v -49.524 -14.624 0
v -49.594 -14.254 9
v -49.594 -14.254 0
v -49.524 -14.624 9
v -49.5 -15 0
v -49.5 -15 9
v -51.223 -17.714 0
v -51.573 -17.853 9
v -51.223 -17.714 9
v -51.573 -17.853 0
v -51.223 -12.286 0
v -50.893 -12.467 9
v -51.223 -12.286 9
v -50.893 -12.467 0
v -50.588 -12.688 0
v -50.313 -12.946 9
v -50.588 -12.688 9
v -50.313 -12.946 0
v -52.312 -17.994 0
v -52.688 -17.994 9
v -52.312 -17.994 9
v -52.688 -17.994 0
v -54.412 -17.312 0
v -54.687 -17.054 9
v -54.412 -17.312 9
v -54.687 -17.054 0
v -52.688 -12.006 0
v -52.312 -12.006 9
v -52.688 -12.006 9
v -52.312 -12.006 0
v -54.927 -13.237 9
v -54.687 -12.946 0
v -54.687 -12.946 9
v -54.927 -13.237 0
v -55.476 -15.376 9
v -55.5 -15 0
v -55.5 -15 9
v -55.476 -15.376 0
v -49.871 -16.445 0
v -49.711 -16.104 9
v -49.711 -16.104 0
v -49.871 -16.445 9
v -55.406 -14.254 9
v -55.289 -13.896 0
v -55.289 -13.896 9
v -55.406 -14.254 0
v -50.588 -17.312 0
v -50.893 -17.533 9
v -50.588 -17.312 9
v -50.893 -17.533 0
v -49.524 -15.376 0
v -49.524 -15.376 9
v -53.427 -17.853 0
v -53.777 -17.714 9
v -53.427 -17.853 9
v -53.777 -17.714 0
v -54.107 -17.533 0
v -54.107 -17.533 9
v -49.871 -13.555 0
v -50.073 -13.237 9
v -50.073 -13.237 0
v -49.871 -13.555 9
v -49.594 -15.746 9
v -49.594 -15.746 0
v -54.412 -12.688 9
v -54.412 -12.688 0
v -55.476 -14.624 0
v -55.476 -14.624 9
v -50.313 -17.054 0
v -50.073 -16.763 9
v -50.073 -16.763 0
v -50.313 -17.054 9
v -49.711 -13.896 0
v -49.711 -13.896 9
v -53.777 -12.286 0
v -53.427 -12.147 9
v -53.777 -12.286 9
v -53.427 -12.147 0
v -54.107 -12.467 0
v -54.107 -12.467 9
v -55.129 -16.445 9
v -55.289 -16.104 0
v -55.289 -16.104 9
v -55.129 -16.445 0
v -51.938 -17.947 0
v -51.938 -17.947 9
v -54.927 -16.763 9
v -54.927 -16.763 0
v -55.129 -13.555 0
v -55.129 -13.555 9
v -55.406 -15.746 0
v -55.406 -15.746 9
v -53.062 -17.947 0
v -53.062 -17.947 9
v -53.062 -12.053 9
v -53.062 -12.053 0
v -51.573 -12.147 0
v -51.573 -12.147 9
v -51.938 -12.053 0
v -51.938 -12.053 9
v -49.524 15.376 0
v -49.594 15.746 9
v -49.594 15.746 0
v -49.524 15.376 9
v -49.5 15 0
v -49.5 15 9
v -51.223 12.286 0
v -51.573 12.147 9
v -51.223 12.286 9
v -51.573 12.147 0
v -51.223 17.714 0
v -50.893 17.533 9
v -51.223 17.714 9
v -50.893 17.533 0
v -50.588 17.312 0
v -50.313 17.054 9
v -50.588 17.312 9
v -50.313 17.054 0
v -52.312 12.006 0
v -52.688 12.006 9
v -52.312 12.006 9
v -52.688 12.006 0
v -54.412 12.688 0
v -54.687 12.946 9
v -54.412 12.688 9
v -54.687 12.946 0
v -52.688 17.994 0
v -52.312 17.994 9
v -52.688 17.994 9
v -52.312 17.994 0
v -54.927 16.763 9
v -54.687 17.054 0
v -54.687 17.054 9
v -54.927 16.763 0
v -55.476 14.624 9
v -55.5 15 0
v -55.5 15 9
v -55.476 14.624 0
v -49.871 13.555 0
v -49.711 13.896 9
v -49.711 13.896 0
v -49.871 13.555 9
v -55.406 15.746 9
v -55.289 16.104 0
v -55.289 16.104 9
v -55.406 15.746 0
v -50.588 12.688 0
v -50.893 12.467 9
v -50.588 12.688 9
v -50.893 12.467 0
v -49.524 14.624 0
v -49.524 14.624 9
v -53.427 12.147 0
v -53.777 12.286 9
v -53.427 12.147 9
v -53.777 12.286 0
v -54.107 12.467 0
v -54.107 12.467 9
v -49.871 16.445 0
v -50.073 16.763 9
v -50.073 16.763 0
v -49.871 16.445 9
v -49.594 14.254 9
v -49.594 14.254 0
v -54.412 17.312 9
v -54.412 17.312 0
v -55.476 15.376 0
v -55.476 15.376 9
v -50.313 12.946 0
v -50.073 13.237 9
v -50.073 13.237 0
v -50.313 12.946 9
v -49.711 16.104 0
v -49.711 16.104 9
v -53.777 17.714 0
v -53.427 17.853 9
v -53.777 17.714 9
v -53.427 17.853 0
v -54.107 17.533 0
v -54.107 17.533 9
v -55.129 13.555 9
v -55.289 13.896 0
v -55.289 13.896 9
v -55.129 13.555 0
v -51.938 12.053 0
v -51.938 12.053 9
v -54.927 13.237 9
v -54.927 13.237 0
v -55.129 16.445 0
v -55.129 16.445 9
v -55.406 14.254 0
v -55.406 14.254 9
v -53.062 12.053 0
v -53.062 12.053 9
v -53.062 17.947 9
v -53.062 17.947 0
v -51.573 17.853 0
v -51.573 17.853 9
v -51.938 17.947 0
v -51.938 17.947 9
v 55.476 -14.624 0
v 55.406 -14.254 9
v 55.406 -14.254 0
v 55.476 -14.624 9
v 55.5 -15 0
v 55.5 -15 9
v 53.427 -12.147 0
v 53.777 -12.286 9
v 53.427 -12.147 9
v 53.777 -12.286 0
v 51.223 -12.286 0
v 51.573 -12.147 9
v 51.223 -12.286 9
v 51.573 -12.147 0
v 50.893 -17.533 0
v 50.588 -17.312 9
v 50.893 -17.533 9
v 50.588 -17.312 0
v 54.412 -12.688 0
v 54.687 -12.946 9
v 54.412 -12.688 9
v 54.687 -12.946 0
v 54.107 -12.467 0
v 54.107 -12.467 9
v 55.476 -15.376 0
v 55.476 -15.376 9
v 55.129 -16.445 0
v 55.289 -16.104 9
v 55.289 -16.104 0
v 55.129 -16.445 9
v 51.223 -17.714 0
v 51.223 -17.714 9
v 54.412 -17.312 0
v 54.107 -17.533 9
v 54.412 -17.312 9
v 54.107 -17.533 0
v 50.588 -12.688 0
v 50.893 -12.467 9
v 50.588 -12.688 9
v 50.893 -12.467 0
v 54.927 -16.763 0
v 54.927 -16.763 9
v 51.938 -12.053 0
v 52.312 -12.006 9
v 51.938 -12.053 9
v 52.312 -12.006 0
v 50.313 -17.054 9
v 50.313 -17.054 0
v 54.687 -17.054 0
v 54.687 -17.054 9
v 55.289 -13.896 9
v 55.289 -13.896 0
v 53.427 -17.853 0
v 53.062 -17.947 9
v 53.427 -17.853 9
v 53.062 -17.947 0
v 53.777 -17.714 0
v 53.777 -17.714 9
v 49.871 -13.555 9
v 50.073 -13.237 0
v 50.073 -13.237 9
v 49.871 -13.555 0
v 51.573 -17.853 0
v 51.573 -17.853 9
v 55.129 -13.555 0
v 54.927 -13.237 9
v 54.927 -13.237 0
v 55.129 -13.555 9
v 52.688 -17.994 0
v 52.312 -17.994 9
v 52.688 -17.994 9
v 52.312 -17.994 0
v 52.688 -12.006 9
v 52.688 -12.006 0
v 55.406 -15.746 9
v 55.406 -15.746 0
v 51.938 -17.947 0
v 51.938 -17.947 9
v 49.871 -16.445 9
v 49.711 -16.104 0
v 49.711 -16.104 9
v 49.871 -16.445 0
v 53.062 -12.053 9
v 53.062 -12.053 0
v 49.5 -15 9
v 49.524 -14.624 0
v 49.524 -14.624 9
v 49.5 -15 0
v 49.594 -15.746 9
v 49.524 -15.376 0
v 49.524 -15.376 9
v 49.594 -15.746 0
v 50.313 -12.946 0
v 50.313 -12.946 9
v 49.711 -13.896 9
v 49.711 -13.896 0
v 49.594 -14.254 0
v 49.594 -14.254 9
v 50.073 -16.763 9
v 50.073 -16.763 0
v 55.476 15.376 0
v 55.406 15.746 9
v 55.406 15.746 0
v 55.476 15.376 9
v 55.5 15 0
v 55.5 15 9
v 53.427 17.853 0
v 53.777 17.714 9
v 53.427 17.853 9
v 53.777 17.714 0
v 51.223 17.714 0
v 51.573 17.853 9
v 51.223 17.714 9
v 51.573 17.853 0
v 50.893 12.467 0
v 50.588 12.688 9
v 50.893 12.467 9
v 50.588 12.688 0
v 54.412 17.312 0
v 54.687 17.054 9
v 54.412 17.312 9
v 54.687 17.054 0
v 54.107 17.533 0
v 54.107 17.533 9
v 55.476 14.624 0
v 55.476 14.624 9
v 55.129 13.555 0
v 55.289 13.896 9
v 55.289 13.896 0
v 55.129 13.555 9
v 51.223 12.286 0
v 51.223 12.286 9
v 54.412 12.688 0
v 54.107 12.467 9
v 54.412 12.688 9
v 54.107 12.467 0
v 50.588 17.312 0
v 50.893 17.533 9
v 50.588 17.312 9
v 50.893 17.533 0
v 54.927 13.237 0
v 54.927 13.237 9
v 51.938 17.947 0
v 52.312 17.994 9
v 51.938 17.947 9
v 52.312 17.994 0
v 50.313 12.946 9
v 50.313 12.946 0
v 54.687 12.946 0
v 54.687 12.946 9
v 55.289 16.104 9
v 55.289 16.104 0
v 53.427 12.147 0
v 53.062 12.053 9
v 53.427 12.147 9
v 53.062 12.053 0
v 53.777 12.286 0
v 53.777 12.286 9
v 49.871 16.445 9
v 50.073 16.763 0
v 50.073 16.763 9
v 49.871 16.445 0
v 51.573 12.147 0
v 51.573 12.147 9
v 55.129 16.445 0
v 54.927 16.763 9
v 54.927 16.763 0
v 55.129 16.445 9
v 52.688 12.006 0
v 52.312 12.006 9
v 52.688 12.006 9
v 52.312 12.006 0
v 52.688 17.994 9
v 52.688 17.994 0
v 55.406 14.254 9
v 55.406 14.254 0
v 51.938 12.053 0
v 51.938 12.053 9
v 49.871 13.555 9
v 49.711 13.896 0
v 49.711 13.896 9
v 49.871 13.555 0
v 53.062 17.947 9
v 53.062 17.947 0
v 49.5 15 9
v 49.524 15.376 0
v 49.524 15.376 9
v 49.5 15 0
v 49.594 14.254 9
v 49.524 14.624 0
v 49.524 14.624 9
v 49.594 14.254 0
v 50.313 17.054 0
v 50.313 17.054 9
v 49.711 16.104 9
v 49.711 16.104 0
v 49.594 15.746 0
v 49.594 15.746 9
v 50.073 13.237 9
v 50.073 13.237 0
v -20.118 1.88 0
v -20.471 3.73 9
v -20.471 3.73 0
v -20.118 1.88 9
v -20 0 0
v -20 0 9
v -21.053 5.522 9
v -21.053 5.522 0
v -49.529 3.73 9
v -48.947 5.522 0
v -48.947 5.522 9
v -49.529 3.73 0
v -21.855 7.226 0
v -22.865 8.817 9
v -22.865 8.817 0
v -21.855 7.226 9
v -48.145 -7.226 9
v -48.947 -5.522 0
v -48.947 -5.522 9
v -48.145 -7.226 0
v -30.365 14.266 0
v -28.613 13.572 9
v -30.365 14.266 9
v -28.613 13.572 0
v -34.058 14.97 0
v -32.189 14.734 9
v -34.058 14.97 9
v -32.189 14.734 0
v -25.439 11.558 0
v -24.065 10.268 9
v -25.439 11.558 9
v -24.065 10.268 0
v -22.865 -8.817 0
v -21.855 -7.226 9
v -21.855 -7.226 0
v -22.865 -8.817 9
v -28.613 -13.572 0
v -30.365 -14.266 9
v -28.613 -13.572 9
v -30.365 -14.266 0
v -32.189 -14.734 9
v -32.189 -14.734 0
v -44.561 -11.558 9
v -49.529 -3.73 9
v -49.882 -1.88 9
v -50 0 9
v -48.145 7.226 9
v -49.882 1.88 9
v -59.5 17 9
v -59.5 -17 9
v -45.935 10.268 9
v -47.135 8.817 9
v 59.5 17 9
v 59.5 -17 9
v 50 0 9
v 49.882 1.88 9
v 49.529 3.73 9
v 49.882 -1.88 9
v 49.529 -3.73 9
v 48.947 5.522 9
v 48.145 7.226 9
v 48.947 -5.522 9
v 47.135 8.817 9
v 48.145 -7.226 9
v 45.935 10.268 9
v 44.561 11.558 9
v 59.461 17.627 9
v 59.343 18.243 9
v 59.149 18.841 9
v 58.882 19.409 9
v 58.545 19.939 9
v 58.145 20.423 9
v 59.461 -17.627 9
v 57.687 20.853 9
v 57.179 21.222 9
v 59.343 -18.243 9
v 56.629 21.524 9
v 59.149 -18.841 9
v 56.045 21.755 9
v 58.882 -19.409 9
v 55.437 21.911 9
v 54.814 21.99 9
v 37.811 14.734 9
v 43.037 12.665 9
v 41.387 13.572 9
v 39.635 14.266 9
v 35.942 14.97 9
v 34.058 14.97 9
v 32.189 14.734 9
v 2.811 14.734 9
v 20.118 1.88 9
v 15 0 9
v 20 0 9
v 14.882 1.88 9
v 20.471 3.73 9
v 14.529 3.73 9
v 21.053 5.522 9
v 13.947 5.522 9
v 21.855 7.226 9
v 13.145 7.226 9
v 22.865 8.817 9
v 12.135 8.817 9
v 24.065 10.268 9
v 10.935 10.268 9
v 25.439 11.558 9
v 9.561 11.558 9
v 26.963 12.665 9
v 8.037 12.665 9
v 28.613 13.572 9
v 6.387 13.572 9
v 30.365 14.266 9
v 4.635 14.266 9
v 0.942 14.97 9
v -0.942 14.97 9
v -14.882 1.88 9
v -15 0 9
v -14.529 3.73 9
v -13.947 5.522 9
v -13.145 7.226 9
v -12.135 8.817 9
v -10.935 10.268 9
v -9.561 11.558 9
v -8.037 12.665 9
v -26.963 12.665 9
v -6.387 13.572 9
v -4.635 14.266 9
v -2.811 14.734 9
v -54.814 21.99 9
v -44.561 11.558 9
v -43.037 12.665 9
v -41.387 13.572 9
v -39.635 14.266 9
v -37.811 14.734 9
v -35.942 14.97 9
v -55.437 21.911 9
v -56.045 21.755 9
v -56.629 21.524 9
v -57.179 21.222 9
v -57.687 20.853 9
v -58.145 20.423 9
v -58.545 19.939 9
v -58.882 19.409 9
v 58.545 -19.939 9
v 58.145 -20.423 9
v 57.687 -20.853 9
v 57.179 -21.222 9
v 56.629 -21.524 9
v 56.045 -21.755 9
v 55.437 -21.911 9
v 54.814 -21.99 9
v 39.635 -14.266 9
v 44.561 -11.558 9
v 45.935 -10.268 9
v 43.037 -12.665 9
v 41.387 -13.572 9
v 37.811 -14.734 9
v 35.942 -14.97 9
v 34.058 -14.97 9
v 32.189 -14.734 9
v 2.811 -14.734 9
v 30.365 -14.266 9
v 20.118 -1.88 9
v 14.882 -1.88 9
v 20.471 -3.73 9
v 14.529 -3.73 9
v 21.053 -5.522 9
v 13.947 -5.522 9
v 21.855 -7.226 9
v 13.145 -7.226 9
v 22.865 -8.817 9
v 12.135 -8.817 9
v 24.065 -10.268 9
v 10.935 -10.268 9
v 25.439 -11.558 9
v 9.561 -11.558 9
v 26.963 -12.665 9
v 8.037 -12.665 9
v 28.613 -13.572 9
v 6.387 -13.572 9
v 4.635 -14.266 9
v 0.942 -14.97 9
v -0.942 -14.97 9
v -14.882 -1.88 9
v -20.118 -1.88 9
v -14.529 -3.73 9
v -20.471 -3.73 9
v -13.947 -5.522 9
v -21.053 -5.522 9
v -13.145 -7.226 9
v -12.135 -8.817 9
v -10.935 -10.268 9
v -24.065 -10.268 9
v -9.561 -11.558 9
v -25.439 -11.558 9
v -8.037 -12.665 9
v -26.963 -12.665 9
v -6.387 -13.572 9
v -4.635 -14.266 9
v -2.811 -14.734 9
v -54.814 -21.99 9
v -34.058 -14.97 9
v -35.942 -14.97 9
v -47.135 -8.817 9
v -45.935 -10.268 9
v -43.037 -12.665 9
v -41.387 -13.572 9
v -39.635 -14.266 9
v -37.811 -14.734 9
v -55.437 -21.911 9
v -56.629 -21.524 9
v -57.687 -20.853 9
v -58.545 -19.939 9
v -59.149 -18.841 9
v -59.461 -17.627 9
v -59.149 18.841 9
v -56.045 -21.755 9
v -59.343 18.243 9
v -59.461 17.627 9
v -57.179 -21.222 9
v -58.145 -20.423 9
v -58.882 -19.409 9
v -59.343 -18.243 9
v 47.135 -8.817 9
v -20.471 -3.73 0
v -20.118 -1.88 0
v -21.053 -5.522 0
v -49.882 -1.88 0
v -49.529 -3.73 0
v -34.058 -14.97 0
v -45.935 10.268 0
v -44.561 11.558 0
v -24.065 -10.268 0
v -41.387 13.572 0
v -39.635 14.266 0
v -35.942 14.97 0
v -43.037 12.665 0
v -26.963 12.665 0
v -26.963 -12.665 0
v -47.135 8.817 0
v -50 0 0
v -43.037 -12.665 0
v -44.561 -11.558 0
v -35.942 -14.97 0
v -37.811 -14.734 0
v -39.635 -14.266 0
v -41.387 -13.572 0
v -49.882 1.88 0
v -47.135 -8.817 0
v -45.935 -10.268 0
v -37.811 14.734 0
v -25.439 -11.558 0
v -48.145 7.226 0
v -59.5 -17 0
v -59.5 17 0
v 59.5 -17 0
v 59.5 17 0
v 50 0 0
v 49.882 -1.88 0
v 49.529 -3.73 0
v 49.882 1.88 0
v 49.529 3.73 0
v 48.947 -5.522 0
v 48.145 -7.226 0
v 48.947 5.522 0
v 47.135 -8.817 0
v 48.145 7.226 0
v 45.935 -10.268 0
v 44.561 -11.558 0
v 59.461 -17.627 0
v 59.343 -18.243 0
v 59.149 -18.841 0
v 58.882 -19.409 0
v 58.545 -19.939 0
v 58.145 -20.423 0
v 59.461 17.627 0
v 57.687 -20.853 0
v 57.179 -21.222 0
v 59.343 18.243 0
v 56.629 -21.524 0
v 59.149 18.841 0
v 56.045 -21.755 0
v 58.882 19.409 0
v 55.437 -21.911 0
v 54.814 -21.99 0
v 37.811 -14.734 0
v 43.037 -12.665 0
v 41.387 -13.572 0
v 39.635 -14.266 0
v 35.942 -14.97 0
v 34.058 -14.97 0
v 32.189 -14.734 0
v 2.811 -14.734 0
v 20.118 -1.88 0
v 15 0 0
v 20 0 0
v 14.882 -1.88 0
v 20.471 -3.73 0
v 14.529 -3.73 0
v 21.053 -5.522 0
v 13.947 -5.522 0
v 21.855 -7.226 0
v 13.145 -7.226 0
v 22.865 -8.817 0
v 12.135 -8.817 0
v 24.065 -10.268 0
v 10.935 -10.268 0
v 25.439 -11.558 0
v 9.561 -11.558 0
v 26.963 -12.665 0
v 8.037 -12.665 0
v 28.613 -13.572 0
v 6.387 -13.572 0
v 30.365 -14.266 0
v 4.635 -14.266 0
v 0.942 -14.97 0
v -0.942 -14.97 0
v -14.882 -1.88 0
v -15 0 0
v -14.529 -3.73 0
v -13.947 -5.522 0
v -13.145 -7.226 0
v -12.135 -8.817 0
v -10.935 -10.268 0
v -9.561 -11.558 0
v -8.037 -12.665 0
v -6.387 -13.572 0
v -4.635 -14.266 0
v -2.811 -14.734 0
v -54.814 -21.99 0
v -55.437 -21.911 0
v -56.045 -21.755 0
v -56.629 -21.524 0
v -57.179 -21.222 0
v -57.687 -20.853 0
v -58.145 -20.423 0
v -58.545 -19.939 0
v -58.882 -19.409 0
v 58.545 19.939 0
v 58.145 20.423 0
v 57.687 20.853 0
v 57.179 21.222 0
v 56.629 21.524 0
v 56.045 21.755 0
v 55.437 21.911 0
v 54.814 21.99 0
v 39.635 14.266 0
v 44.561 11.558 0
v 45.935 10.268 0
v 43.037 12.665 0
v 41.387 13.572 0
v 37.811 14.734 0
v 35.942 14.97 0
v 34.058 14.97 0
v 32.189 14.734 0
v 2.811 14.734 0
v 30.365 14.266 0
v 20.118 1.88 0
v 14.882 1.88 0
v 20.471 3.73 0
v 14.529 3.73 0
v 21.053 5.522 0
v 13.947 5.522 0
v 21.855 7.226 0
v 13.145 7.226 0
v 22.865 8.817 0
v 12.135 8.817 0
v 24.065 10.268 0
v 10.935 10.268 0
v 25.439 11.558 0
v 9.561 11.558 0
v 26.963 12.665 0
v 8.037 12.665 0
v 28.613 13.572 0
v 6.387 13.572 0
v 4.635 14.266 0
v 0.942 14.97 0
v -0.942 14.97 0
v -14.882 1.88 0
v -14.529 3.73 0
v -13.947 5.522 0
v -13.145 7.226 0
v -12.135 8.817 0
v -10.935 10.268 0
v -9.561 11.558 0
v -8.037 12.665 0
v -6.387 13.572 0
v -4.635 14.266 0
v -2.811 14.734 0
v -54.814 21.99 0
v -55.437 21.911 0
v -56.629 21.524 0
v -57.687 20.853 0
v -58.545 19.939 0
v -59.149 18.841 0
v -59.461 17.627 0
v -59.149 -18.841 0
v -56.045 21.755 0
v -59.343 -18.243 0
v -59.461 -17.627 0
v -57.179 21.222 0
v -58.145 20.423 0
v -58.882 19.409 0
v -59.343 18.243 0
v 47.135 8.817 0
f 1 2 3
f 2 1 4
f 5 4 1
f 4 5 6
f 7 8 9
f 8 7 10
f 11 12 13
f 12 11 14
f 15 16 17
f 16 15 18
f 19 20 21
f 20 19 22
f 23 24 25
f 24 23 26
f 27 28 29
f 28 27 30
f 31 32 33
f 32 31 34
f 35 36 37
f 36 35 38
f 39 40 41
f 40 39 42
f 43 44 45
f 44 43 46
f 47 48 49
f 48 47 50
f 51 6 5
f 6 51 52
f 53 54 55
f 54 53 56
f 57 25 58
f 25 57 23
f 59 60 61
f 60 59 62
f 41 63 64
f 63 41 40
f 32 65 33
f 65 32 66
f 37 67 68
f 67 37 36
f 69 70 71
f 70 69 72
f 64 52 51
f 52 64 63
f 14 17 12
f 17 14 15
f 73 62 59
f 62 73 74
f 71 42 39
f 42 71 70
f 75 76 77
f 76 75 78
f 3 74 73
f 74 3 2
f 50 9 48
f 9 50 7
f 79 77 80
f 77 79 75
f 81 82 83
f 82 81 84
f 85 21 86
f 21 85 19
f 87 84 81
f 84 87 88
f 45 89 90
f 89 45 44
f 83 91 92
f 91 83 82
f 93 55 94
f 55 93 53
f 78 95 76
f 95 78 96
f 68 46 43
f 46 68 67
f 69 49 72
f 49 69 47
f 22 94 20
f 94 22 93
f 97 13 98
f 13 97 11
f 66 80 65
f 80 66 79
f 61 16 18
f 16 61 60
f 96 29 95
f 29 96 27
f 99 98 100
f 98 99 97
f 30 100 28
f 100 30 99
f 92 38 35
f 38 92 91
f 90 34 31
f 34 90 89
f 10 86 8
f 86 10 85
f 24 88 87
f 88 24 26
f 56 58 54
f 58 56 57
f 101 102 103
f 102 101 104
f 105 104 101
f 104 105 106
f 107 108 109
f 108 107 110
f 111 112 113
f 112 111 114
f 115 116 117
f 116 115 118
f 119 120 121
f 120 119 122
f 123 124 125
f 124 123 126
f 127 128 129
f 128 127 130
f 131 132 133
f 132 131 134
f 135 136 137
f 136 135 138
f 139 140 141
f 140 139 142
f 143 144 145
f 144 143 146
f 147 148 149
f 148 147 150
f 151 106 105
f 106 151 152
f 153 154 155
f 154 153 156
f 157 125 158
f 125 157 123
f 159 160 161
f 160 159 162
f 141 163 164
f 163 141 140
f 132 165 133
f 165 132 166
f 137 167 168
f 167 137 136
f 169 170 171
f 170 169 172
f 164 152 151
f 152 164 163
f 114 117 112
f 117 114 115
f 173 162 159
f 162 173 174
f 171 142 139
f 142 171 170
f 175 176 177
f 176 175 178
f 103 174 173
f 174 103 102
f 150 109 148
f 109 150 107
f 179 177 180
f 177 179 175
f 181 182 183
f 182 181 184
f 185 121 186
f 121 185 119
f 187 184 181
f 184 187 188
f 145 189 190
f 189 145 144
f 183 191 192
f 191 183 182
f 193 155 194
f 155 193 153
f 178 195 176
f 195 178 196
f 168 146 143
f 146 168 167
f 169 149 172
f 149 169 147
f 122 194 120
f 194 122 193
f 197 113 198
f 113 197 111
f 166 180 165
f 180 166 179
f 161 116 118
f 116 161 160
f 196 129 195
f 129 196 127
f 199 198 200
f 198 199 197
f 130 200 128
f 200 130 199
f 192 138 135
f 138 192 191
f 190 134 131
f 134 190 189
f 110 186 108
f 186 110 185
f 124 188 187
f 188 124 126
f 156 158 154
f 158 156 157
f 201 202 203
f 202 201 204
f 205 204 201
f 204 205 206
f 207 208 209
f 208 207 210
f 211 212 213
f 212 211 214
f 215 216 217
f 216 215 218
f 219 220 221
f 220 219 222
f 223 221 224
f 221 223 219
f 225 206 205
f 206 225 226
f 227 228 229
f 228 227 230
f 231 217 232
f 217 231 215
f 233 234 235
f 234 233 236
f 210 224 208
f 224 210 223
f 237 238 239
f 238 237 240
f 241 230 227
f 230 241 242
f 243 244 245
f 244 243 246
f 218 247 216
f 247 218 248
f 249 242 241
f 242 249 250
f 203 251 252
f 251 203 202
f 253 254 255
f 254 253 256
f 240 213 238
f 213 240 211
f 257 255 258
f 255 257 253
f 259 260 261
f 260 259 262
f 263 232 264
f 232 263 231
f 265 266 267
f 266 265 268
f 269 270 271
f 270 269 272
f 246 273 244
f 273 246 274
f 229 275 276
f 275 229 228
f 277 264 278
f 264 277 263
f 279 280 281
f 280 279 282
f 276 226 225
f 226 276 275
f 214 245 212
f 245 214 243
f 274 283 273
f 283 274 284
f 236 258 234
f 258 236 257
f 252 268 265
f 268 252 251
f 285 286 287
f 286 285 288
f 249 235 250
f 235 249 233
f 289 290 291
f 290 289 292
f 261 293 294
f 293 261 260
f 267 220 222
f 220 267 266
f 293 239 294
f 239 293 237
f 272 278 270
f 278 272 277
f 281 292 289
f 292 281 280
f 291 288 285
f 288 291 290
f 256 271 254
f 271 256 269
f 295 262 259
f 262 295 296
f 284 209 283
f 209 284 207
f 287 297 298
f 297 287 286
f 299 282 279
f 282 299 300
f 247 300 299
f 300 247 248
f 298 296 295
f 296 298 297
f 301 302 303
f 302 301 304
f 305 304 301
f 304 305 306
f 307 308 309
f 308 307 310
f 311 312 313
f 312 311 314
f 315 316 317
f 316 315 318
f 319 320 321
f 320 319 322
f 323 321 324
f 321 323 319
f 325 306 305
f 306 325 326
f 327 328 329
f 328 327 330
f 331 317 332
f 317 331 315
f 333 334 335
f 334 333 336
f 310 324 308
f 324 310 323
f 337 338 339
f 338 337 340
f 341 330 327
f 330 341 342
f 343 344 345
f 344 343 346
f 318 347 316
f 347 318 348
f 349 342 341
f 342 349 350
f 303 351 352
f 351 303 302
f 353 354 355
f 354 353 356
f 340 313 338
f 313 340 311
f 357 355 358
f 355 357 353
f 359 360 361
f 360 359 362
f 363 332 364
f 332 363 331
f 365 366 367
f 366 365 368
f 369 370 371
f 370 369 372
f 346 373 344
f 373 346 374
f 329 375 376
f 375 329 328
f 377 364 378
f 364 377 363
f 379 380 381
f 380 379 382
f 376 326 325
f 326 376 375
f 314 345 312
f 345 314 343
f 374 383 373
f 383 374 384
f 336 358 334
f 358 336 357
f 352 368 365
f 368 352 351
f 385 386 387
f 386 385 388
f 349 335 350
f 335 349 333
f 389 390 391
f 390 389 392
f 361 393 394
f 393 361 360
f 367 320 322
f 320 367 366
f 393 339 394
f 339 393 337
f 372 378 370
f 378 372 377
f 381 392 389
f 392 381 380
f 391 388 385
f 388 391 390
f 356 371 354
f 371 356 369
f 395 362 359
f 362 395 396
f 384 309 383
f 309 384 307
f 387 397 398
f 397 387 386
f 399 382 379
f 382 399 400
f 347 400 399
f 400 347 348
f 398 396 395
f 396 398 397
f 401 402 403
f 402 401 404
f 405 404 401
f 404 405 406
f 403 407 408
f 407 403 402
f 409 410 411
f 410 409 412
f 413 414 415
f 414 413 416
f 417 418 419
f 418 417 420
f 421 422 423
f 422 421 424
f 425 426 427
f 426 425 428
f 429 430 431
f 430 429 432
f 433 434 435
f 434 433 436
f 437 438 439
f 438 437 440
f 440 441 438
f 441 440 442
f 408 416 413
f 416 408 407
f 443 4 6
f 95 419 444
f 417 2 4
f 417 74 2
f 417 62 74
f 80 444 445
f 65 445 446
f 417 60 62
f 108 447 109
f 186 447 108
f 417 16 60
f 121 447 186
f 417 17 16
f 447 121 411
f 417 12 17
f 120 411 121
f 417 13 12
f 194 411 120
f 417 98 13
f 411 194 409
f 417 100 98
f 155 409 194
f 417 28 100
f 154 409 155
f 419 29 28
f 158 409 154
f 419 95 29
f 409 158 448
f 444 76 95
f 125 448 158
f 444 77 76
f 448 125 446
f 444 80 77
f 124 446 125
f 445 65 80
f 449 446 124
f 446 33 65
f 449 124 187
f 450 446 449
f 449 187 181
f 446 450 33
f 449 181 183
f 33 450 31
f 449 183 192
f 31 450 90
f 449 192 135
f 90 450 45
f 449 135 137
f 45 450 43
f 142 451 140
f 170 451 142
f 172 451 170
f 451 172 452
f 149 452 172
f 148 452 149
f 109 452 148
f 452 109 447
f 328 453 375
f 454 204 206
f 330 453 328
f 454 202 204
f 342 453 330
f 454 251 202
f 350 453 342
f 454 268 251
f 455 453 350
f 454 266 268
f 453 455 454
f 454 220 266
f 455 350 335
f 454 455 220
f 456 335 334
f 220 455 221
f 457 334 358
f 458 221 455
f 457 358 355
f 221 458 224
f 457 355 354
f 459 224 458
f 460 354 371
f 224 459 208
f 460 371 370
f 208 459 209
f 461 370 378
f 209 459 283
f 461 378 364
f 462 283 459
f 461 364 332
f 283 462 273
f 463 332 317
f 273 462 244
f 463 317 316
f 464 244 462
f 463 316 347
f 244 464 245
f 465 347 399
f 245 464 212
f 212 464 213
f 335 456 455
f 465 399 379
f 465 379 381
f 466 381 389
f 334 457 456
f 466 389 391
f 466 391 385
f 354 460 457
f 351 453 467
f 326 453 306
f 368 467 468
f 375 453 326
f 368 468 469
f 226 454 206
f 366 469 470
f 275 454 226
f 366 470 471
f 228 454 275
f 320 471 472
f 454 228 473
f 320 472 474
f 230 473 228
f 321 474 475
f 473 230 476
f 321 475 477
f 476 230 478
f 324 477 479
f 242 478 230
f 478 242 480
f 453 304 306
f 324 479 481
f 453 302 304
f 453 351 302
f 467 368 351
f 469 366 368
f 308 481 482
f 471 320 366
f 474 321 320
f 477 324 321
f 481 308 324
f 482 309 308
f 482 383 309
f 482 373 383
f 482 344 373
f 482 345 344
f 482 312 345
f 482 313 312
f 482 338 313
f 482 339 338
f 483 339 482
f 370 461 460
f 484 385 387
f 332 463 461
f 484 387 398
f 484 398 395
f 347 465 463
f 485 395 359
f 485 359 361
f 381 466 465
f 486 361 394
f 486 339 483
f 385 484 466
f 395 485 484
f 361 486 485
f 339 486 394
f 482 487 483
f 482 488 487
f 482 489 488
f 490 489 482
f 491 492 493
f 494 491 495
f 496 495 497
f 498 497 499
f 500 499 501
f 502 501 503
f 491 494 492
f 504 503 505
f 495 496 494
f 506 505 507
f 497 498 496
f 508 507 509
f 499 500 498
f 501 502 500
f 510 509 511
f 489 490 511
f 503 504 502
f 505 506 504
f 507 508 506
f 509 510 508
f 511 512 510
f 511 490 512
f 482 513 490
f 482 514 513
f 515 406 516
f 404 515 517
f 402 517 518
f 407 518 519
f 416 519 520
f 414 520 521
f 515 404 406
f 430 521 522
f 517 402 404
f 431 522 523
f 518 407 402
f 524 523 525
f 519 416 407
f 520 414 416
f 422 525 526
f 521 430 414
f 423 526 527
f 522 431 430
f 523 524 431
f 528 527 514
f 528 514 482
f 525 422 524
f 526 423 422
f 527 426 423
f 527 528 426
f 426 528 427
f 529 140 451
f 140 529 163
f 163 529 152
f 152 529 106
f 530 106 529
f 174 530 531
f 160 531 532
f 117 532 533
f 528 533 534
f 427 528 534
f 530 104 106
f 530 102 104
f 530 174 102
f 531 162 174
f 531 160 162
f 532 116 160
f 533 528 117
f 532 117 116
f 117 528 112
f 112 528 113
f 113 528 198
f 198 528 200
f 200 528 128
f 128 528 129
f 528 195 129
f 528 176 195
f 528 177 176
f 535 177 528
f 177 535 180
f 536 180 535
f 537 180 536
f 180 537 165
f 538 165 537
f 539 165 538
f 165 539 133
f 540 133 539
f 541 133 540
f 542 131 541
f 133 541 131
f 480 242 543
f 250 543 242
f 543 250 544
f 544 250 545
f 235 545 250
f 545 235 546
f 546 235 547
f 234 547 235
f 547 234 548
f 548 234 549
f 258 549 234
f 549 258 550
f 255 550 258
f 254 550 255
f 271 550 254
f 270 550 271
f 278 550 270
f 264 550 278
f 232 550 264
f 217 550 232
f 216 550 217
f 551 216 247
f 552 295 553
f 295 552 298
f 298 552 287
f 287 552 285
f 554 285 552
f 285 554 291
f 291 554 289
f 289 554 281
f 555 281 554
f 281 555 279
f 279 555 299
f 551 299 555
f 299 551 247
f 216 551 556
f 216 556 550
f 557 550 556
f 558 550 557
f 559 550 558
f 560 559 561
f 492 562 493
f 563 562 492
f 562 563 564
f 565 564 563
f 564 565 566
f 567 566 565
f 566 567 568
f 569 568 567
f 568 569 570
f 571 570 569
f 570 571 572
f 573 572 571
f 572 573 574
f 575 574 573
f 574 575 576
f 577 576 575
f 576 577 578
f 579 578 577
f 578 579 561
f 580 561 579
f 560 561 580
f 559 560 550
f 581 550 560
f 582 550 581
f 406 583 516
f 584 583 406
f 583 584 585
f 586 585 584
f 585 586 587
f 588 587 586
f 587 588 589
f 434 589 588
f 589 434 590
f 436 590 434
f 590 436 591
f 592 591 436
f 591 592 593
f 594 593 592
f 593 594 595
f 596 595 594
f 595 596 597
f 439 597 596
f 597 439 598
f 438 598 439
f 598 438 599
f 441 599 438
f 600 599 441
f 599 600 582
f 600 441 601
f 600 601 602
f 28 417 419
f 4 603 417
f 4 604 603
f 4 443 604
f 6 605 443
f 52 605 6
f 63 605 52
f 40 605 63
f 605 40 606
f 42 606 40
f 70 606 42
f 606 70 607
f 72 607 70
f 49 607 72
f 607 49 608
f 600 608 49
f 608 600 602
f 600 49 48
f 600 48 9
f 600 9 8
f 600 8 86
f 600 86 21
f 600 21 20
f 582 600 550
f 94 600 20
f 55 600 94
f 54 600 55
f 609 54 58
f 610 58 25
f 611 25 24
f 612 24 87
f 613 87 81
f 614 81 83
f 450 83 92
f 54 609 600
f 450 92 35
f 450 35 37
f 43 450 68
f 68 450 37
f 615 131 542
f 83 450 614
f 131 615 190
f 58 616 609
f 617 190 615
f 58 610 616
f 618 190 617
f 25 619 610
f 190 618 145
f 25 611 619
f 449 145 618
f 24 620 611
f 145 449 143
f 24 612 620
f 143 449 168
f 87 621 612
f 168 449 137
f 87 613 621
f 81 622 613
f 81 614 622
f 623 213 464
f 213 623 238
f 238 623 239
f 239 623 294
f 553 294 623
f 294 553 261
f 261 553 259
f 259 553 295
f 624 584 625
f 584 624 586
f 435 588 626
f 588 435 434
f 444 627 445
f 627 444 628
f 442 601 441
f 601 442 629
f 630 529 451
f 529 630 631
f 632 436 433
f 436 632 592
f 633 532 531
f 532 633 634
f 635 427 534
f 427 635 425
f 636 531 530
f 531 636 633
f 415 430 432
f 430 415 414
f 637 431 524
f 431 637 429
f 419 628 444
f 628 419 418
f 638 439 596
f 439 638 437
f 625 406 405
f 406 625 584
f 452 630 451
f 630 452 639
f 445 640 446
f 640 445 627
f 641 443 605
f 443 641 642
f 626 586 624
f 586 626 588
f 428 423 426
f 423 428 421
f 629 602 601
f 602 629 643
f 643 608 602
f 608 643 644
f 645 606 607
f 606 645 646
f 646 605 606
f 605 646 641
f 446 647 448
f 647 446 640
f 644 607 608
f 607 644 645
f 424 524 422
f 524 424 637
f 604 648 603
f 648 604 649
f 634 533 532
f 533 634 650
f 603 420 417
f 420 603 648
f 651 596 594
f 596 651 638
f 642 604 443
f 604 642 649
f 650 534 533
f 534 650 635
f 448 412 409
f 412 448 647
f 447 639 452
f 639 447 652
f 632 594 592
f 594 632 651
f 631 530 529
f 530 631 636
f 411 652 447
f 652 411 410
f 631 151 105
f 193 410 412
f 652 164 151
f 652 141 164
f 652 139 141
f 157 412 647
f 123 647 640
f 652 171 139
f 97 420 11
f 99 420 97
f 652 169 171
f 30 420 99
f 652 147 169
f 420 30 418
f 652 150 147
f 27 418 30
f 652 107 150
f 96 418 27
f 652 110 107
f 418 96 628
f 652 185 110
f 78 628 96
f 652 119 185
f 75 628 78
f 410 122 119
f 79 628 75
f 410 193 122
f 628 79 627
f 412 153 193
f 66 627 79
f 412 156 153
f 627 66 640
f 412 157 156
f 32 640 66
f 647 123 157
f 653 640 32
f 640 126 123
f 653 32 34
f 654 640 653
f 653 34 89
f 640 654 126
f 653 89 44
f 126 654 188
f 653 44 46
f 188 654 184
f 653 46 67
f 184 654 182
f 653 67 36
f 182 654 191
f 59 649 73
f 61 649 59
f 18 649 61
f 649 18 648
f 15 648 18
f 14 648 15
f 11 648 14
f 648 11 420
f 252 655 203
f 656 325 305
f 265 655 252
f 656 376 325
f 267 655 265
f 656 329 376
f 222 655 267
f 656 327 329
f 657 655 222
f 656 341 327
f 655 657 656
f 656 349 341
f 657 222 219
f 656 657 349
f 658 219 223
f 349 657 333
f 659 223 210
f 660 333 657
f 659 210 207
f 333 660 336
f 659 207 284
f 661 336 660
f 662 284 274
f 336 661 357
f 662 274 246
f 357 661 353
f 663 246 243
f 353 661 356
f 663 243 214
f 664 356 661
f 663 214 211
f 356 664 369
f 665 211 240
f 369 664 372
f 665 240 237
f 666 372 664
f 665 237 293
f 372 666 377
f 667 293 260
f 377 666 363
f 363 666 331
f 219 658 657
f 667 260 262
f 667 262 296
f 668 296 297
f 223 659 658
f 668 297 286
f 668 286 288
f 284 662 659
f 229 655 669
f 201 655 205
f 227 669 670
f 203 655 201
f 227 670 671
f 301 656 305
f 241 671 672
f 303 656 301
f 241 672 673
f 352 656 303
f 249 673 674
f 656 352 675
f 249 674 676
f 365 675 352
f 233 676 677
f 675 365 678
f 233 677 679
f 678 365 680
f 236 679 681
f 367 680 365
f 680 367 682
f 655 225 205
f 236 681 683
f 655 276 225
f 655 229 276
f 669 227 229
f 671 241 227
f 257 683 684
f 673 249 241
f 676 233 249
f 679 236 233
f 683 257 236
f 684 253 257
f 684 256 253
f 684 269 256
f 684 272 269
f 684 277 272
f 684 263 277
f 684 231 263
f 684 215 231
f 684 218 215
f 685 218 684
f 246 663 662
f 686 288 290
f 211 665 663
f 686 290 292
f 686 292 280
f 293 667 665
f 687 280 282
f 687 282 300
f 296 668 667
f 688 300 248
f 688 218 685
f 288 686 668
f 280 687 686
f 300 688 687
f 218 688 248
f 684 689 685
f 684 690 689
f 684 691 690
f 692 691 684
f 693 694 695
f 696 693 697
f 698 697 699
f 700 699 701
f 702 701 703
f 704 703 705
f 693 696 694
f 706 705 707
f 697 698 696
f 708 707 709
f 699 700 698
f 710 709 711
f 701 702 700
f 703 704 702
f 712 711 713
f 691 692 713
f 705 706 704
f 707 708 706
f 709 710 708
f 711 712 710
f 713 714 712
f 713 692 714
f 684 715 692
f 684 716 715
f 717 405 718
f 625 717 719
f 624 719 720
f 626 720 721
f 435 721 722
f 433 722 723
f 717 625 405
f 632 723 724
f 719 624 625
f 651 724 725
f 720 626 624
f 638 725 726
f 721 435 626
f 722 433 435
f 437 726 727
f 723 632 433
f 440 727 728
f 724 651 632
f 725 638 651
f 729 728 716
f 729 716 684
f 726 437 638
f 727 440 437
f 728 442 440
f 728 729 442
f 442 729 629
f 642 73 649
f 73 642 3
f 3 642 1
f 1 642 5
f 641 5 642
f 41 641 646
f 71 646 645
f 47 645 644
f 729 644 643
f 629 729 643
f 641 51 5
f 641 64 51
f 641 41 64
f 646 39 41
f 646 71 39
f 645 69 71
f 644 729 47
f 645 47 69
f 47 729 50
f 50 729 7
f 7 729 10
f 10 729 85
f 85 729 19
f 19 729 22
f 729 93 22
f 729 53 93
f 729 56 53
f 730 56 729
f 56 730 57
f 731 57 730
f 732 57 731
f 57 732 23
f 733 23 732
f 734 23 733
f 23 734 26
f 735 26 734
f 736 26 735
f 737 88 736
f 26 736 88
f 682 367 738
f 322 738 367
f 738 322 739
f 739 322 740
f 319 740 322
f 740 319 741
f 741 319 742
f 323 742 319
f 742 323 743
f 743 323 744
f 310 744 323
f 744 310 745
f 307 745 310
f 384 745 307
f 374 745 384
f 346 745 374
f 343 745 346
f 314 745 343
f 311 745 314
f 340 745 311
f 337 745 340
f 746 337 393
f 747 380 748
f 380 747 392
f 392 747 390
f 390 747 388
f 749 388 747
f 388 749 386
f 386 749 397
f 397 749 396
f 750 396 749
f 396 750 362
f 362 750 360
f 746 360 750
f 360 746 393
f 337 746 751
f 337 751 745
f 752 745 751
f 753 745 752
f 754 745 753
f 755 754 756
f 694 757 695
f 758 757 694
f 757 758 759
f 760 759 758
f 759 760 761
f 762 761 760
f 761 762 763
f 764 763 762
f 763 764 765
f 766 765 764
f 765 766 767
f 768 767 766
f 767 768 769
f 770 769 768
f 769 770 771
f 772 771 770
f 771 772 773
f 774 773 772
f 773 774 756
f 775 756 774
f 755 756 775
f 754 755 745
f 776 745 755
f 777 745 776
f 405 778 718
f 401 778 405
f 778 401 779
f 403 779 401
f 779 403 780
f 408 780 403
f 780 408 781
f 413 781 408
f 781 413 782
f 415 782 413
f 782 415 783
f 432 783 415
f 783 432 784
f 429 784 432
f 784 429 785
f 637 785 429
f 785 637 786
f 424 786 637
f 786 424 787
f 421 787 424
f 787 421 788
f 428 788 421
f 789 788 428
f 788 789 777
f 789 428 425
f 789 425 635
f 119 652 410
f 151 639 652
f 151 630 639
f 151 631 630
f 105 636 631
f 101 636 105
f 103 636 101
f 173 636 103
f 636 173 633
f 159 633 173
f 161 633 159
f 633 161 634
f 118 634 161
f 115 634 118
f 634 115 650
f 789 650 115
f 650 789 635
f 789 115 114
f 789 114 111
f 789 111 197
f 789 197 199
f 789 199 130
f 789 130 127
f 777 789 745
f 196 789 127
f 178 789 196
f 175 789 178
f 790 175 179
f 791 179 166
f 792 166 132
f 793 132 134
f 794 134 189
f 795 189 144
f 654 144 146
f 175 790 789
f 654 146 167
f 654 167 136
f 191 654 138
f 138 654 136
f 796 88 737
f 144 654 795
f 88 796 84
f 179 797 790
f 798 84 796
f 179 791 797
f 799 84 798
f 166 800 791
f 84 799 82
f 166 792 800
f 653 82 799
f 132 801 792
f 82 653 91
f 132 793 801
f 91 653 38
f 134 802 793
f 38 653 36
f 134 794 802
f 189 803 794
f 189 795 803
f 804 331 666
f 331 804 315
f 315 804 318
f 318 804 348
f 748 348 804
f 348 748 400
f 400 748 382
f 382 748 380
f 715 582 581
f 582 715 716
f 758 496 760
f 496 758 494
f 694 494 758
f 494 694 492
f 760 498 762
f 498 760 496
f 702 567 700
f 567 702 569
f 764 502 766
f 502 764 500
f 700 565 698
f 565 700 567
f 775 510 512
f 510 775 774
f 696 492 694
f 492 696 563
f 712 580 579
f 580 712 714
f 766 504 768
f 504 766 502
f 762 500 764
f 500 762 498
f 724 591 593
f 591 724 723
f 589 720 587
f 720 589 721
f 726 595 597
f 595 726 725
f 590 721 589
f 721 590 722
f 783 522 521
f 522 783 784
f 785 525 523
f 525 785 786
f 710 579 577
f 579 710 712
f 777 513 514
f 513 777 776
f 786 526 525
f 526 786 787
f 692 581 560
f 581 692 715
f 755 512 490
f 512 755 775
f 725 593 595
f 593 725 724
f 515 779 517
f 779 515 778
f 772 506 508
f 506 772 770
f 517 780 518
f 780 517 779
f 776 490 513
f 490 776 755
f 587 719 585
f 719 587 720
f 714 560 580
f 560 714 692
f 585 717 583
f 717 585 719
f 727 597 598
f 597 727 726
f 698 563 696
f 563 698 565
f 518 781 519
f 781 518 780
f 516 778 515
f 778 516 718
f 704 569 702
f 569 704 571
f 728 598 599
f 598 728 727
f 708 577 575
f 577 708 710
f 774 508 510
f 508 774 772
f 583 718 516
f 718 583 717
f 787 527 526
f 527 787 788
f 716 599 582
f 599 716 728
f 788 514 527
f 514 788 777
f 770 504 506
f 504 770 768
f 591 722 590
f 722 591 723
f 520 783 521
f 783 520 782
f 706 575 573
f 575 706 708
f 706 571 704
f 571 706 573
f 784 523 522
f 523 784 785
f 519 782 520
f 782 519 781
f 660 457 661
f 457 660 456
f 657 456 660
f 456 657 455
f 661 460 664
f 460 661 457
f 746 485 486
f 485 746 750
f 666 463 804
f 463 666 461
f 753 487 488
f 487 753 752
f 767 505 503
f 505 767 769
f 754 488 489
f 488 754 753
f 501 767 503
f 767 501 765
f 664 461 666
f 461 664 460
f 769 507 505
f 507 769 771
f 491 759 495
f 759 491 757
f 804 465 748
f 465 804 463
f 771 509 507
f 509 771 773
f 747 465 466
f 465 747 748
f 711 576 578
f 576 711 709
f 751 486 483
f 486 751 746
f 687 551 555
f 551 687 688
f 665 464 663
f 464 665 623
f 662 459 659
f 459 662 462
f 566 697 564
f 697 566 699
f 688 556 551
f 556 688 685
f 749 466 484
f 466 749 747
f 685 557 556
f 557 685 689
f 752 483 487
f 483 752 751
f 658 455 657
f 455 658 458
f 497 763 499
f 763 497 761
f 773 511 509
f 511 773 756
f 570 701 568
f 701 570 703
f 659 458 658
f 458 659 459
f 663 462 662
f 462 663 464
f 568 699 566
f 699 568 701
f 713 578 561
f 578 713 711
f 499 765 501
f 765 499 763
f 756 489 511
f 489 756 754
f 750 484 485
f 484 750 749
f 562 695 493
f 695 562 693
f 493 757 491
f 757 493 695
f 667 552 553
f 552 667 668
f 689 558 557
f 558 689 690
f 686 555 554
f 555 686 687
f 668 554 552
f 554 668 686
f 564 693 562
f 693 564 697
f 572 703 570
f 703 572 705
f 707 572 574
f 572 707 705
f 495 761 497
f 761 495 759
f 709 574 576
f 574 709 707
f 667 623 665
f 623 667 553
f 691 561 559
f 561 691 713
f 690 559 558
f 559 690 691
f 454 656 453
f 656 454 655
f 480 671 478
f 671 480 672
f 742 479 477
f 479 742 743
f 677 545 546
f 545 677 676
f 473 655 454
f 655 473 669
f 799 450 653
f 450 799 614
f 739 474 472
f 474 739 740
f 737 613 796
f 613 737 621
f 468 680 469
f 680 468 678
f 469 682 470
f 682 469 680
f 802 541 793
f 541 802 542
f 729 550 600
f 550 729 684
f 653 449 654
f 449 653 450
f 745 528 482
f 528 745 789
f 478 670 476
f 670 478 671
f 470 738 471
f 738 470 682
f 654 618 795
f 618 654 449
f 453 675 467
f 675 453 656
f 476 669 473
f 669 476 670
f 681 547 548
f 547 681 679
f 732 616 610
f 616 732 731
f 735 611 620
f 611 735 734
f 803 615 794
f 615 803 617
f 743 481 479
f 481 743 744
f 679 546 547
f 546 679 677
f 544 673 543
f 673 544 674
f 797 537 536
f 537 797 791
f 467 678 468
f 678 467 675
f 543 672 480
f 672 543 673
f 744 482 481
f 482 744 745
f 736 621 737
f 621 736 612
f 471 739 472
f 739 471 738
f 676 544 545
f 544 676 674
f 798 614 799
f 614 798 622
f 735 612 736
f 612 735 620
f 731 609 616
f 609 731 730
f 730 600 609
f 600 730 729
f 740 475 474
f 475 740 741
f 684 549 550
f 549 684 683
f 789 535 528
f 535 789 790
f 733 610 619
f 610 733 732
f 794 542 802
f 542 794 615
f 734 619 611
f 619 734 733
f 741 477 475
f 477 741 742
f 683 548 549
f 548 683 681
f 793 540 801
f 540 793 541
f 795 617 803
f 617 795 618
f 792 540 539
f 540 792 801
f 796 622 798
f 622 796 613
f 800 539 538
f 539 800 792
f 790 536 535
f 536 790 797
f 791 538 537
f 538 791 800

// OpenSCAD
$fn = 50;

difference() {
	union() {
		hull() {
			translate(v = [-54.5, 17.0, 0]) {
				cylinder(h = 9, r = 5);
			}
			translate(v = [54.5, 17.0, 0]) {
				cylinder(h = 9, r = 5);
			}
			translate(v = [-54.5, -17.0, 0]) {
				cylinder(h = 9, r = 5);
			}
			translate(v = [54.5, -17.0, 0]) {
				cylinder(h = 9, r = 5);
			}
		}
	}
	union() {
		translate(v = [-52.5, -15.0, -100.0]) {
			cylinder(h = 200, r = 3.0);
		}
		translate(v = [-52.5, 15.0, -100.0]) {
			cylinder(h = 200, r = 3.0);
		}
		translate(v = [52.5, -15.0, -100.0]) {
			cylinder(h = 200, r = 3.0);
		}
		translate(v = [52.5, 15.0, -100.0]) {
			cylinder(h = 200, r = 3.0);
		}
		translate(v = [-52.5, -15.0, -100.0]) {
			cylinder(h = 200, r = 1.5);
		}
		translate(v = [-52.5, 15.0, -100.0]) {
			cylinder(h = 200, r = 1.5);
		}
		translate(v = [52.5, -15.0, -100.0]) {
			cylinder(h = 200, r = 1.5);
		}
		translate(v = [52.5, 15.0, -100.0]) {
			cylinder(h = 200, r = 1.5);
		}
		translate(v = [-35.0, 0, 0.0]) {
			cylinder(h = 9, r = 15.0);
		}
		cylinder(h = 9, r = 15.0);
		translate(v = [35.0, 0, 0.0]) {
			cylinder(h = 9, r = 15.0);
		}
	}
}
